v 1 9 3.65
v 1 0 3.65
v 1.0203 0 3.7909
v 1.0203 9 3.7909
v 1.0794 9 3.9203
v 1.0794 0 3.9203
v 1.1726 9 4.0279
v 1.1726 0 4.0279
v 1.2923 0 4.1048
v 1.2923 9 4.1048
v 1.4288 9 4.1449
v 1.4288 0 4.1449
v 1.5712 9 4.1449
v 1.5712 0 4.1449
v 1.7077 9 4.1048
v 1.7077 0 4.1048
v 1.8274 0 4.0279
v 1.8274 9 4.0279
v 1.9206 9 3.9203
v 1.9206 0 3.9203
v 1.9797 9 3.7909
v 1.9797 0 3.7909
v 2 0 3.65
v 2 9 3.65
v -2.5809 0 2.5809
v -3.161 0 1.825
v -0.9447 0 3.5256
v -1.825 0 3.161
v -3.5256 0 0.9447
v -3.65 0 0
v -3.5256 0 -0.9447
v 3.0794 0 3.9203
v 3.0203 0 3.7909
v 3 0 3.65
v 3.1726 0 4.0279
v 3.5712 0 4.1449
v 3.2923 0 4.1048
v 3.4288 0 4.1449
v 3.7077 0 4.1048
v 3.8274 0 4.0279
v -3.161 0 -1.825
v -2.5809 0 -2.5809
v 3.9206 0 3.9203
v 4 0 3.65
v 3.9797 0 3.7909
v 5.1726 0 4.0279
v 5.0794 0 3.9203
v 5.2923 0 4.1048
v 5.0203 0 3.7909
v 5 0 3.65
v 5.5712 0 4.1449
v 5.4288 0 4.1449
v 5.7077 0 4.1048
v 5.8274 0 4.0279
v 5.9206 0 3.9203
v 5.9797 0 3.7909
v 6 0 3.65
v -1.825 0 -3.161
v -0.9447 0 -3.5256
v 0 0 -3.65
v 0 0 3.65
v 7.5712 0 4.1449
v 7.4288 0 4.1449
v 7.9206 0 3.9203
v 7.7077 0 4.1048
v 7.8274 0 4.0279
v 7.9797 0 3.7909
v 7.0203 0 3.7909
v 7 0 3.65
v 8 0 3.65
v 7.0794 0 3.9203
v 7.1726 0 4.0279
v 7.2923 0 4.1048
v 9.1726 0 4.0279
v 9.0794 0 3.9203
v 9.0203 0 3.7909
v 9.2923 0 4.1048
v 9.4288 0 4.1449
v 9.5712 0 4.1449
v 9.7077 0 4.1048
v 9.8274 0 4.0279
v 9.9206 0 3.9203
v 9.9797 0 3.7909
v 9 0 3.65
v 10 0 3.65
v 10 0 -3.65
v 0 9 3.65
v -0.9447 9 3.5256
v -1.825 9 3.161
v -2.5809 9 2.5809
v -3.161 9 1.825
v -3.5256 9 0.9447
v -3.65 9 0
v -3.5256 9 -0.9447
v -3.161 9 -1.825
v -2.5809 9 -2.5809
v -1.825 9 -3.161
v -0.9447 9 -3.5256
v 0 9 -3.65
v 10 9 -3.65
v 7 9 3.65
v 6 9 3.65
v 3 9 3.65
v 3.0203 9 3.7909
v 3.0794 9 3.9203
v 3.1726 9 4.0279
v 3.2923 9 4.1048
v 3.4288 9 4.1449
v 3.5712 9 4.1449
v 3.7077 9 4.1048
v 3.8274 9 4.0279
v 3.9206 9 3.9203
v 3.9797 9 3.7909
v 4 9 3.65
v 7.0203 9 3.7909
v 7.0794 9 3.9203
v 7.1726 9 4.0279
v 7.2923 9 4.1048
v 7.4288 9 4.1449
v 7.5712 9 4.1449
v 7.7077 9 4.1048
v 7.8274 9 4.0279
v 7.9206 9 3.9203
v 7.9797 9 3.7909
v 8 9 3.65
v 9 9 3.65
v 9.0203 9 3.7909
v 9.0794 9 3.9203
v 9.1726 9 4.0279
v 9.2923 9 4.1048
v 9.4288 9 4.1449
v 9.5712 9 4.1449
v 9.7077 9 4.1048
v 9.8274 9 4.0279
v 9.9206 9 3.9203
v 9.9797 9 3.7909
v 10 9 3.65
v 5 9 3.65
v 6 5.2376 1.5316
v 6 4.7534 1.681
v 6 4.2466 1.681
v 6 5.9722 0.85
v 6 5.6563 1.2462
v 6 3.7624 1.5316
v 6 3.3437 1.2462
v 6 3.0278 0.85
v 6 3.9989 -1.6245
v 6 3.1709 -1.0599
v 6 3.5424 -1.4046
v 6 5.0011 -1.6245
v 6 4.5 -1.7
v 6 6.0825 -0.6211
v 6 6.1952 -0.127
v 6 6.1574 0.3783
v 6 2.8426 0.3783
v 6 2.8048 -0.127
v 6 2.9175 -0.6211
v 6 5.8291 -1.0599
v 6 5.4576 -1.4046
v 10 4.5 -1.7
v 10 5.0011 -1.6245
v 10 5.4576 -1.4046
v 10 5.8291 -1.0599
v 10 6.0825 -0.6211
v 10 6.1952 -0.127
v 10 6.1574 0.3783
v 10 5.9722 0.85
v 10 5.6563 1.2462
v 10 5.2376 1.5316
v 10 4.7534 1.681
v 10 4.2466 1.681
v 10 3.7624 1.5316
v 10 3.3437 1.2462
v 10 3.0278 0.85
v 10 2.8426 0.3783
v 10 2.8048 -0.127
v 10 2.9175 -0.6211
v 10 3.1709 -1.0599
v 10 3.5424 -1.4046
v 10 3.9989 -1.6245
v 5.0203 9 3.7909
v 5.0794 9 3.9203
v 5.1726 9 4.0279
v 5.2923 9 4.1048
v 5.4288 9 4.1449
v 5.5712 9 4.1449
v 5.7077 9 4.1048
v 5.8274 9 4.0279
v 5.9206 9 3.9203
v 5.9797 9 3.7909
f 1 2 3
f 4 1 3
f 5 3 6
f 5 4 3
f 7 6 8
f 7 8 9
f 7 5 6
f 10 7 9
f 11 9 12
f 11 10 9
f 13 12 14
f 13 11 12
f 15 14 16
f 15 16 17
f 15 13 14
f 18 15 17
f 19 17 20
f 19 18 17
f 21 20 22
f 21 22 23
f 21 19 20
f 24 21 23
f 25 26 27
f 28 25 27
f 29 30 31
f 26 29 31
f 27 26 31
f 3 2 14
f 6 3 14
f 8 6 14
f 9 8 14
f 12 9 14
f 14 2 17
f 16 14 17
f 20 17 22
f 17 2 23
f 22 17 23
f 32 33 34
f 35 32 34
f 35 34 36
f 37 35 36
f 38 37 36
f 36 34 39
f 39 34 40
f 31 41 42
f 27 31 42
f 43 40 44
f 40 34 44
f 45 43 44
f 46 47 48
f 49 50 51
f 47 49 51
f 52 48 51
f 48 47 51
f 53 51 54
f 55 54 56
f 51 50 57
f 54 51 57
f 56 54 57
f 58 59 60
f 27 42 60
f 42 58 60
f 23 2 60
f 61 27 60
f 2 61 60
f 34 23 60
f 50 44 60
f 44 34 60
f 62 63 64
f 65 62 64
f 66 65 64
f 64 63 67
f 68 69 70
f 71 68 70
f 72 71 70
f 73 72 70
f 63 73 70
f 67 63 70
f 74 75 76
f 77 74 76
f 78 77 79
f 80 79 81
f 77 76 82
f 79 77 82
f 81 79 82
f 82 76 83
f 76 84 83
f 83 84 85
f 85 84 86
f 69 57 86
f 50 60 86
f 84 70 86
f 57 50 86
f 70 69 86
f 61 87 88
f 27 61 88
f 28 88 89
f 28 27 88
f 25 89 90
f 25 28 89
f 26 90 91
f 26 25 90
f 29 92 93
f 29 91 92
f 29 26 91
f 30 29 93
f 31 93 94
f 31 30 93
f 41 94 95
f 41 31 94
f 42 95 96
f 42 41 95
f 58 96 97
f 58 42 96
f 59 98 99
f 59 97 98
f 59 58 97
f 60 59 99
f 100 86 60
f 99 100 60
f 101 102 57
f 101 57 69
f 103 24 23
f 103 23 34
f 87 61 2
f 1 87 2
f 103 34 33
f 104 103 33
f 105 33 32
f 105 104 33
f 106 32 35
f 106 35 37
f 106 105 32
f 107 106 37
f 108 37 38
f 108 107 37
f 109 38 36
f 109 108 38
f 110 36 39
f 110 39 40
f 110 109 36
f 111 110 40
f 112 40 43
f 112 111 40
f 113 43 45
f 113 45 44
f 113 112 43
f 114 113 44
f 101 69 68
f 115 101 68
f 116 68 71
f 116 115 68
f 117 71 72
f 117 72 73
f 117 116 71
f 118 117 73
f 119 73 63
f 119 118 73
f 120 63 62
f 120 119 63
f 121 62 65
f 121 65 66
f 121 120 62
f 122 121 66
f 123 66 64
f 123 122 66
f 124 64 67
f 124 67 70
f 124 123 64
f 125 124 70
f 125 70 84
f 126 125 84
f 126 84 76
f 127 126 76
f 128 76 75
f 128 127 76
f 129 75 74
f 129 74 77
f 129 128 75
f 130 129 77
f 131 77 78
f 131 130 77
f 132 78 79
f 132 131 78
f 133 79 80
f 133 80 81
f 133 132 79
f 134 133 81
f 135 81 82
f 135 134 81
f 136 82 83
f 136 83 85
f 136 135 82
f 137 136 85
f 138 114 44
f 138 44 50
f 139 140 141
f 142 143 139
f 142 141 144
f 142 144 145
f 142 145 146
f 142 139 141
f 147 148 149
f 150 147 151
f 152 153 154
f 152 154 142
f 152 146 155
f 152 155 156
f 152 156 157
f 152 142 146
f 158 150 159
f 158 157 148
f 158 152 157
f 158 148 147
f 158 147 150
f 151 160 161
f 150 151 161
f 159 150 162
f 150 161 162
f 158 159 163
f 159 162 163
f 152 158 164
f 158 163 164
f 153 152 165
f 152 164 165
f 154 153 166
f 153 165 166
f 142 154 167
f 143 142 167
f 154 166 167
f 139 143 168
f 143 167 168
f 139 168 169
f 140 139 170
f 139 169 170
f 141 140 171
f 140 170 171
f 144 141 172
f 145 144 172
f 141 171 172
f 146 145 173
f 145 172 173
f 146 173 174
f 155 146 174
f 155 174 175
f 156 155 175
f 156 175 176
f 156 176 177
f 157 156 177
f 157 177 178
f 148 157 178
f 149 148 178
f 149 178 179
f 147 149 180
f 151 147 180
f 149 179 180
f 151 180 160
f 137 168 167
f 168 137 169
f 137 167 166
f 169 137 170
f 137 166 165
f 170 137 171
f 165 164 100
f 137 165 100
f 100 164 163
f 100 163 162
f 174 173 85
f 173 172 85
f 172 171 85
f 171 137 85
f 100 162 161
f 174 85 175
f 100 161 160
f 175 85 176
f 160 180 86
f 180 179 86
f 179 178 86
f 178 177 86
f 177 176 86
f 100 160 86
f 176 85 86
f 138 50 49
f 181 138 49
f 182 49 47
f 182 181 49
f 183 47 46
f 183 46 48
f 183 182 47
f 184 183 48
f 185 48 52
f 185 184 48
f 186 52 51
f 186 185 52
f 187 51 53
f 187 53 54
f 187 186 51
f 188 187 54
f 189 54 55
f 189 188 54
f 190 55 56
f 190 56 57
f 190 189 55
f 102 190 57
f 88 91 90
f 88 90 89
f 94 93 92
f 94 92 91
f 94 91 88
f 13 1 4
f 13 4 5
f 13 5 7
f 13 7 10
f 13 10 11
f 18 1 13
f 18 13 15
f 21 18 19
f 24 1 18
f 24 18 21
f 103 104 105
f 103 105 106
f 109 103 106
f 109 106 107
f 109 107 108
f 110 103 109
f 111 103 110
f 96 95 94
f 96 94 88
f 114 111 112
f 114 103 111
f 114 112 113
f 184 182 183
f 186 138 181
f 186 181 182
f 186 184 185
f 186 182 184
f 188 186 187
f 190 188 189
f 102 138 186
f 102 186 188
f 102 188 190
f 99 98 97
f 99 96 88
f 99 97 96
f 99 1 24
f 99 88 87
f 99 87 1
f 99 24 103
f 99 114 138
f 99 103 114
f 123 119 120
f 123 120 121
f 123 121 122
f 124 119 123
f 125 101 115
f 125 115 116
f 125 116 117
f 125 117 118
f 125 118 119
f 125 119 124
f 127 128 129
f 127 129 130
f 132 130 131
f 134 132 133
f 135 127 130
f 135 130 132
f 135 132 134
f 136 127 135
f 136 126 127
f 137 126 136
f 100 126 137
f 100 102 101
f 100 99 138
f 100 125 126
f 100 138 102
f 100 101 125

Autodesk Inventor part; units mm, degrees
ref_plane "YZ Plane" through (0, 0, 0) normal (1, 0, 0) x (0, 1, 0)
ref_plane "XZ Plane" through (0, 0, 0) normal (0, 1, 0) x (-1, 0, 0)
ref_plane "XY Plane" through (0, 0, 0) normal (0, 0, 1) x (1, 0, 0)
sketch "Sketch1" plane through (0, 0, 0) normal (0, 1, 0) x (-1, 0, 0)
  arc A0 (0, -3.65) -> (0, 3.65) centre (0, 0) ccw
  line L0 (0, 3.65) -> (-10, 3.65)
  line L1 (-10, 3.65) -> (-10, -3.65)
  line L2 (-10, -3.65) -> (0, -3.65)
  line L3 (0, 3.65) -> (0, -3.65)
  dimension "d0" = 10
  dimension "d1" = 7.3
extrude "Extrusion1" add sketch "Sketch1" along normal blind 9
sketch "Sketch2" plane through (0, 9, 0) normal (0, 1, 0) x (1, 0, 0)
  line L0 (9, -3.65) -> (10, -3.65)
  arc A0 (9, -3.65) -> (10, -3.65) centre (9.5, -3.65) ccw
  point P0 (0, 0)
  dimension "d4" = 1
extrude "Extrusion2" add sketch "Sketch2" against normal blind 9
pattern_linear "Rectangular Pattern1" count 5 spacing 2 along (-1, 0, 0) of "Extrusion2"
sketch "Sketch3" plane through (10, 0, -3.65) normal (1, 0, 0) x (0, 0, -1)
  line L0 (-3.65, 0) -> (-3.65, 9)
  line L1 (0, 9) -> (-7.3, 9) projected
  circle A0 centre (-3.65, 4.5) radius 1.7
  dimension "d10" = 3.4
extrude "Extrusion3" cut sketch "Sketch3" against normal blind 4
properties part number "XY_Tensioner" material "ABS Plastic"
